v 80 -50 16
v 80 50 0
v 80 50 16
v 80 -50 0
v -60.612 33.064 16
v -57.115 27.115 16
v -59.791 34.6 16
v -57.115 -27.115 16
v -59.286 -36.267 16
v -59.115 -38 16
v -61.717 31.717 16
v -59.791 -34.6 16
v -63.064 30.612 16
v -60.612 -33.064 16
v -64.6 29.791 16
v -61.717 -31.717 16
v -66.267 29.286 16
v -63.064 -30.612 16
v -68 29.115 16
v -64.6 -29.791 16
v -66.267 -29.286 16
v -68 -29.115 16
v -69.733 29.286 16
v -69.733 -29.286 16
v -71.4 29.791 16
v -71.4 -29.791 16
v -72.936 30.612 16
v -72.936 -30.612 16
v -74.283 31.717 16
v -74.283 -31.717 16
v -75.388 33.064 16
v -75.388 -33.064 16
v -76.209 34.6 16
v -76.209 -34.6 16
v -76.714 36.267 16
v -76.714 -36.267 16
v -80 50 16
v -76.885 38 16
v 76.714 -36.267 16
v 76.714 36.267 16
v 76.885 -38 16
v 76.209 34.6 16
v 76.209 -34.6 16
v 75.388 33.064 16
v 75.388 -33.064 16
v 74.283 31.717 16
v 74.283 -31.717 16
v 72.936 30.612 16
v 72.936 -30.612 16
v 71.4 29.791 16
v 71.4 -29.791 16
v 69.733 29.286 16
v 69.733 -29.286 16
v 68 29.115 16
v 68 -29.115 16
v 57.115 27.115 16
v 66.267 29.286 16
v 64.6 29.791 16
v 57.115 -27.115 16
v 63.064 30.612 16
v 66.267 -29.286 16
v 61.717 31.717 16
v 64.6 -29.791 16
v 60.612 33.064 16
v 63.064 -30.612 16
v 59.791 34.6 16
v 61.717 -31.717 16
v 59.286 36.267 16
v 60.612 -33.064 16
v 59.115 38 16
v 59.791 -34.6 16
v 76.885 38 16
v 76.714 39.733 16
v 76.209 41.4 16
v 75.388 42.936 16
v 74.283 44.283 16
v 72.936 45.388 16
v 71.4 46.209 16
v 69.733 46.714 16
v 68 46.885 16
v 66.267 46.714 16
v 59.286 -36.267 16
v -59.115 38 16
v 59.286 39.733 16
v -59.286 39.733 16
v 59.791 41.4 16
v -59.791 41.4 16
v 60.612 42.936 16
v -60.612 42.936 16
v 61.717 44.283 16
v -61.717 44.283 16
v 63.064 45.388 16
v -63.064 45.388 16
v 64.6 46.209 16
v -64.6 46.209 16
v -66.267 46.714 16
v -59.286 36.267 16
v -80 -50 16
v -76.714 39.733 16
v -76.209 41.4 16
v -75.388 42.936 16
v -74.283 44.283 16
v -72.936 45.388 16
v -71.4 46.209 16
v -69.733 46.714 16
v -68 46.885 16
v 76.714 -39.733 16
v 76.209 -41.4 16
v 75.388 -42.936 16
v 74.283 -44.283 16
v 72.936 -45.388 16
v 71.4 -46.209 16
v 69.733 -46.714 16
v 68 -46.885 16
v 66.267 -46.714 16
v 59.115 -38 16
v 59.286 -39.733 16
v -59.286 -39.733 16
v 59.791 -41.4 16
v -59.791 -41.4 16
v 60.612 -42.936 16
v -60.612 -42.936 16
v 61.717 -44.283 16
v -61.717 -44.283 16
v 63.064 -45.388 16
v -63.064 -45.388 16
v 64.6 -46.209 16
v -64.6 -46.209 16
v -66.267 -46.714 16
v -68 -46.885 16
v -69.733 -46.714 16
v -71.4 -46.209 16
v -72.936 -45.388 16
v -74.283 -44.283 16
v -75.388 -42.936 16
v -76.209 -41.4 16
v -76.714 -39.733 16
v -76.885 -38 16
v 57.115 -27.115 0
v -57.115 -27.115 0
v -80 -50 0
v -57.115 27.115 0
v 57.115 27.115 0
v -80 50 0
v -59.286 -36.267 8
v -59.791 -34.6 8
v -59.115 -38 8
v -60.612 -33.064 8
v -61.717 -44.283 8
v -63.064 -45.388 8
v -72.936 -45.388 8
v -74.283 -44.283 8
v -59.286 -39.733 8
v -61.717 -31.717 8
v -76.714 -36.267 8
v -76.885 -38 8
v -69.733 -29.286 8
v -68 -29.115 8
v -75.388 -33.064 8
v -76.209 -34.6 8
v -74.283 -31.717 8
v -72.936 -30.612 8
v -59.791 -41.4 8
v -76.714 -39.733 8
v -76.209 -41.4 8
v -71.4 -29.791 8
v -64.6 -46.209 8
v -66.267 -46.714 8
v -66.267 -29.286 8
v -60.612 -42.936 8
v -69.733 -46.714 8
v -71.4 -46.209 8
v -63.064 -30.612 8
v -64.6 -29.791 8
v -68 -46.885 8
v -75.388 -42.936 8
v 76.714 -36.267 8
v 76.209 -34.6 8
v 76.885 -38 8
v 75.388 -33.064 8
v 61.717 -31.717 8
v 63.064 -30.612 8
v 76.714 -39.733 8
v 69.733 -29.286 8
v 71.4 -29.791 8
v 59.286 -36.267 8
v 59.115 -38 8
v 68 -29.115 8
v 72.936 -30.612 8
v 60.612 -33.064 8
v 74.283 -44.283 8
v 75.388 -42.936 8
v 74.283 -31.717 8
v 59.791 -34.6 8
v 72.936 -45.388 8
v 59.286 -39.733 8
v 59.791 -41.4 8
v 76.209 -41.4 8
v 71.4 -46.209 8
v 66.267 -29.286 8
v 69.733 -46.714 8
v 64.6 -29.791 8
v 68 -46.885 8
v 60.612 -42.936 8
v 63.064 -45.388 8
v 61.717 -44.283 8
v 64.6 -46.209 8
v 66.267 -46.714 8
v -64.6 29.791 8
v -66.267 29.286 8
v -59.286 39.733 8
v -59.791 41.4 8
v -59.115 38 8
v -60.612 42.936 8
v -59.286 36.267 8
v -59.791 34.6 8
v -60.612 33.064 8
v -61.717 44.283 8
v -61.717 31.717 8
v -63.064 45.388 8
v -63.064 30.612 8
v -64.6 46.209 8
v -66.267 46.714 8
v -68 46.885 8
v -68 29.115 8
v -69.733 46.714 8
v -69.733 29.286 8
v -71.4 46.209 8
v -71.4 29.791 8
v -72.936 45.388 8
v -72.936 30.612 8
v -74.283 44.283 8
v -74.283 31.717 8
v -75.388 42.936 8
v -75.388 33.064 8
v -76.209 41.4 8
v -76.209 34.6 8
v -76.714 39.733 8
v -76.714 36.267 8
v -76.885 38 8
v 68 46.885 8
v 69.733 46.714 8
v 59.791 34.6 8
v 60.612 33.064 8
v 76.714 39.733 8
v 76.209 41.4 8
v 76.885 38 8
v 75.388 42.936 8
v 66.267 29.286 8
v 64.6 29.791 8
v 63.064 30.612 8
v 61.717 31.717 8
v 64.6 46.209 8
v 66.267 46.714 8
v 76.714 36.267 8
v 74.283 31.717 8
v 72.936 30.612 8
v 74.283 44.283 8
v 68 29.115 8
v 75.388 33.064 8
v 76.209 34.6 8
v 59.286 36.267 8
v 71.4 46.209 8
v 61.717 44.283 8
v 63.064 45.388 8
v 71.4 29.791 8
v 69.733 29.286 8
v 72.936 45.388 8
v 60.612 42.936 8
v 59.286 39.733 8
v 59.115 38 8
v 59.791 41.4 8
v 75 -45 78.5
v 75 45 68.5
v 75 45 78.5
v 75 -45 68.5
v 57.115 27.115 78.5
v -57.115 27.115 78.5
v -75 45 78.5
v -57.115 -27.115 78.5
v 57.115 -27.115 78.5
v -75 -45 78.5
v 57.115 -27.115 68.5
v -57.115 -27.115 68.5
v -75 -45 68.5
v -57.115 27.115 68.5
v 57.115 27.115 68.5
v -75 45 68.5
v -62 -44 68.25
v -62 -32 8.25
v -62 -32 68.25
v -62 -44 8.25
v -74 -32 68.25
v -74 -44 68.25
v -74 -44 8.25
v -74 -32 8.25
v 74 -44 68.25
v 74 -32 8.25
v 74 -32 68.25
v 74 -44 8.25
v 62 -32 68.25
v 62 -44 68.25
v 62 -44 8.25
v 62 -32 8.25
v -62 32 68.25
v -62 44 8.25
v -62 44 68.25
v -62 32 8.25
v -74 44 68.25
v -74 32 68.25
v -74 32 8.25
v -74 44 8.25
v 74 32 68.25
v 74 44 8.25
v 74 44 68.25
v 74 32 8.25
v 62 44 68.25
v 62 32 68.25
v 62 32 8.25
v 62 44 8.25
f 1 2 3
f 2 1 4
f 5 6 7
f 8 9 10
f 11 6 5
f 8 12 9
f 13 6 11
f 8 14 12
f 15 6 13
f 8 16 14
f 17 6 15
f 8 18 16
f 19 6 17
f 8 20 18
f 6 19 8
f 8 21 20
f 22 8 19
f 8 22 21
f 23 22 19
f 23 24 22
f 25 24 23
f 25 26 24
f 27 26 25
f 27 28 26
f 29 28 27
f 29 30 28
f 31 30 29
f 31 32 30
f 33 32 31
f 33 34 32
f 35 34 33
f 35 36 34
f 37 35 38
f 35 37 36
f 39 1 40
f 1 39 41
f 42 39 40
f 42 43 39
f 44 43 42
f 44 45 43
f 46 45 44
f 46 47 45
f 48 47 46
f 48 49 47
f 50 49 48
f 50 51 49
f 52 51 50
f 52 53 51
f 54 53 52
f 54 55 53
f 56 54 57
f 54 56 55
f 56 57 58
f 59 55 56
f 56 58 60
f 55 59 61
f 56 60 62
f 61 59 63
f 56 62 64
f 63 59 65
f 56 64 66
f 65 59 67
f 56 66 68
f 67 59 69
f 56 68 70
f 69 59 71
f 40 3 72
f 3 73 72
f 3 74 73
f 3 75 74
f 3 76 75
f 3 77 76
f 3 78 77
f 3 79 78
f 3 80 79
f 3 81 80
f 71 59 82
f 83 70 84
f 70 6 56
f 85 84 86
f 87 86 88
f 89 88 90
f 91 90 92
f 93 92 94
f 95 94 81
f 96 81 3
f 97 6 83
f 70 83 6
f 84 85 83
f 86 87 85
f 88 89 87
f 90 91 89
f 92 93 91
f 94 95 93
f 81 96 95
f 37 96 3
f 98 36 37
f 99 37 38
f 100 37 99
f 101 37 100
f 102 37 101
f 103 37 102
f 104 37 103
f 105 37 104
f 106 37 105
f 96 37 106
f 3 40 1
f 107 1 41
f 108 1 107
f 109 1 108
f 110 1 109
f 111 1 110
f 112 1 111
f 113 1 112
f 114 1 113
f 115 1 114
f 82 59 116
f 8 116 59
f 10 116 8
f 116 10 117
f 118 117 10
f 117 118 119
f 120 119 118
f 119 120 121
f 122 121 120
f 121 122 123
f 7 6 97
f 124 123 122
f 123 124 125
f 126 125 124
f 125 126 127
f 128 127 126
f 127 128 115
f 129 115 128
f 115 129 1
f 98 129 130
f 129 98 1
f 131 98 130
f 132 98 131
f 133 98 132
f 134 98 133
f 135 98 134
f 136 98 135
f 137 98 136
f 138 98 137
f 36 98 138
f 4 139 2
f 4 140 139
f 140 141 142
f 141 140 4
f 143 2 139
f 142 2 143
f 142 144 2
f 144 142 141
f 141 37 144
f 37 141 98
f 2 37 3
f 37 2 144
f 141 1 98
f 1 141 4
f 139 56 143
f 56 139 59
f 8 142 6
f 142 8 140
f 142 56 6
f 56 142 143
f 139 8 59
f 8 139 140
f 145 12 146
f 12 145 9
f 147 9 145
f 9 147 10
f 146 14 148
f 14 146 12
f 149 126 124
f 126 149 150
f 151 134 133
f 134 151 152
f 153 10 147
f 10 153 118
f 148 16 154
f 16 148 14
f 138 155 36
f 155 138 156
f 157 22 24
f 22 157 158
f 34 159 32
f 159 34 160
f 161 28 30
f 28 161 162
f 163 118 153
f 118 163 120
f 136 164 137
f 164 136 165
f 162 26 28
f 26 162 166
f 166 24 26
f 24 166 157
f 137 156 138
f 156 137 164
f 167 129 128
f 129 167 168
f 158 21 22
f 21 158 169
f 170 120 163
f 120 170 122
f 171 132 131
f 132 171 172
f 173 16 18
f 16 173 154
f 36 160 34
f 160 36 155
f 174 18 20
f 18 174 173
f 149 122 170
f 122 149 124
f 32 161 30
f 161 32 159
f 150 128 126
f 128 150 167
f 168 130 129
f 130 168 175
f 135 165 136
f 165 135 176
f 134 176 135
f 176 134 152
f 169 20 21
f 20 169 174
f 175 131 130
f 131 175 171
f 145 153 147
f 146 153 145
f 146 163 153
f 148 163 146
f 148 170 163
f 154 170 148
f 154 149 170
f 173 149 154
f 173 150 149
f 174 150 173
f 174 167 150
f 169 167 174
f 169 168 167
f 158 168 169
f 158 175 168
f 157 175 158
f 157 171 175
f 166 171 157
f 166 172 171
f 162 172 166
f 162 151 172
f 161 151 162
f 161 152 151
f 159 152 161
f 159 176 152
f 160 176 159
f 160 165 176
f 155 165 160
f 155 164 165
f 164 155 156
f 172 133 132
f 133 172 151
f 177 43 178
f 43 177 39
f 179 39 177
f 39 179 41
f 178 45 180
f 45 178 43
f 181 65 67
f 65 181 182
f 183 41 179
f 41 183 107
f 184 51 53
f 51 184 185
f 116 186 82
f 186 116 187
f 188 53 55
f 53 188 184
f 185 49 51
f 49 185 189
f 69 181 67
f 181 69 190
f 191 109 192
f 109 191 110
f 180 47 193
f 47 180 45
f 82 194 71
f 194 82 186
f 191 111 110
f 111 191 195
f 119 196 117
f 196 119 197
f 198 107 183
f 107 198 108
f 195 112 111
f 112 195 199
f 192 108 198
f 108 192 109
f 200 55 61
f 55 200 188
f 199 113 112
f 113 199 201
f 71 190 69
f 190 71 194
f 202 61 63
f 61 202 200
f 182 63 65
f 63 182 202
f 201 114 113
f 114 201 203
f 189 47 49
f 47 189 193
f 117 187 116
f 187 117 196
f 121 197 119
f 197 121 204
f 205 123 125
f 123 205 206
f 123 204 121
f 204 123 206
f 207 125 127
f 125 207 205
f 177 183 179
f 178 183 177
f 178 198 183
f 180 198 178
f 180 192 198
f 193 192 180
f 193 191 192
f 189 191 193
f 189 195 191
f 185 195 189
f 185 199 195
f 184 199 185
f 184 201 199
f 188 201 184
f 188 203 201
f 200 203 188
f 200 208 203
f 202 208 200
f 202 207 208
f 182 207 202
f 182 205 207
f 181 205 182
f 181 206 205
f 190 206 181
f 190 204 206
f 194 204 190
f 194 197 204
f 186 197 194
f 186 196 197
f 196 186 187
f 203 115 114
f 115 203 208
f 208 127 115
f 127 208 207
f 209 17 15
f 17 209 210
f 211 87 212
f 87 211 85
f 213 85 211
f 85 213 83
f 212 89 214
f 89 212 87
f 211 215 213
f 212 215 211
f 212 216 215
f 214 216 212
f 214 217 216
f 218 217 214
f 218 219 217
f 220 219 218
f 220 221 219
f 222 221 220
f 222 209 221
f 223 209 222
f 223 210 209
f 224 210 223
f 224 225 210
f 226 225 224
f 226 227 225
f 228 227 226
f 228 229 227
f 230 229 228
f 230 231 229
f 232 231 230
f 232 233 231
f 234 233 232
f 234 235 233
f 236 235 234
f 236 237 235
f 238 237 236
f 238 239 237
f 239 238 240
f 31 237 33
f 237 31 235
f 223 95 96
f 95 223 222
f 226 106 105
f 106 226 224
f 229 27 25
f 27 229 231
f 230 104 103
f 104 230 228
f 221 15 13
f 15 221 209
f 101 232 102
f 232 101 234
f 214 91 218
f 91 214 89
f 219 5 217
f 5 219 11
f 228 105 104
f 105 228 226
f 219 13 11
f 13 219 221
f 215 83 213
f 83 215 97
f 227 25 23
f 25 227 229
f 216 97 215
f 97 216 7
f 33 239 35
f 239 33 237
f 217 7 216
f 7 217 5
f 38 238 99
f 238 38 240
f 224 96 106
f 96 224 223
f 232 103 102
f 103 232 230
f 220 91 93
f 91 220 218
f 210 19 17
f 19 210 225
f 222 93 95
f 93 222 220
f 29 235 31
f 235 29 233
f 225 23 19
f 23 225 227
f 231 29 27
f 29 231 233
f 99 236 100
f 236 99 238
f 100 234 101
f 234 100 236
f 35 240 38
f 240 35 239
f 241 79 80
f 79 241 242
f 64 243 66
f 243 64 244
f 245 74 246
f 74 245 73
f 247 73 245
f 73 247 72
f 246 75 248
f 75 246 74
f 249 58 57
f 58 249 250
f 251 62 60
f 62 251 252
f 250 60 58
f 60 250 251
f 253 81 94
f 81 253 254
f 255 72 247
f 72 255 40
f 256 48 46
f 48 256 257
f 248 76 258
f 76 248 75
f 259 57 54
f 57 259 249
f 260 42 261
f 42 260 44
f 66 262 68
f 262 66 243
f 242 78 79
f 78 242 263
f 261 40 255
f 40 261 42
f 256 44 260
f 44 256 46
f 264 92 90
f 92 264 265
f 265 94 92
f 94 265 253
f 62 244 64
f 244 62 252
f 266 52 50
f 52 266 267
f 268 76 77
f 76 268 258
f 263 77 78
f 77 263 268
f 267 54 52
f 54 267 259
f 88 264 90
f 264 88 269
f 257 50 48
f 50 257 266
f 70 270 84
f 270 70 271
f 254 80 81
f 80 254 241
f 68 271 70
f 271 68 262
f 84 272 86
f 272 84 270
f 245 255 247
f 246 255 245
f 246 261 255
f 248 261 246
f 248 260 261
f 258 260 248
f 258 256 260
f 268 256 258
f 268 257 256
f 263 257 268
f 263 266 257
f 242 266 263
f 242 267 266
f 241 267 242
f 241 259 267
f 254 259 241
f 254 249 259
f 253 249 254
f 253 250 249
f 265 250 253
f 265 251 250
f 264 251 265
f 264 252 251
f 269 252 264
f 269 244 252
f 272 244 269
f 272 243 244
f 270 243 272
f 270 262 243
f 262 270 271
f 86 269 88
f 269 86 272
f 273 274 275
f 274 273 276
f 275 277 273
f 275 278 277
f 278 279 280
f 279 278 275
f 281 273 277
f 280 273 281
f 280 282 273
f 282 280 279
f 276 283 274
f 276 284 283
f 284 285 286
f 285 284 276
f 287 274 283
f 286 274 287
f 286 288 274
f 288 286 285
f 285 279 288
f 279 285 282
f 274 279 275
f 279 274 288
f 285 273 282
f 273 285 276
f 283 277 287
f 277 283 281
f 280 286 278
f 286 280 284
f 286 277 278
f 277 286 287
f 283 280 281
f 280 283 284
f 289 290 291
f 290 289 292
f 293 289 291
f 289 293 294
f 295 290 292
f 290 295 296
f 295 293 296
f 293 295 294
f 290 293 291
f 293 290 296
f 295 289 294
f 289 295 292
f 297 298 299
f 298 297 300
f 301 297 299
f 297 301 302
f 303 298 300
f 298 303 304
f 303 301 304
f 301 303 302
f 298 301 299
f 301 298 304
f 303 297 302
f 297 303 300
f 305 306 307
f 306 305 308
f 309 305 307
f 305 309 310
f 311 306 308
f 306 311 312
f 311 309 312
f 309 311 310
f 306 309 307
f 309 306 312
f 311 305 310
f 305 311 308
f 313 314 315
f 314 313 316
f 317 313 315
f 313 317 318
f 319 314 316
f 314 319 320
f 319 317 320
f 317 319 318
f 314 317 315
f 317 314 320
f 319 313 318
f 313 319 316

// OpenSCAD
$fn = 32;

// ------------------------------------------------------------------------
// Frame cube: base 160 x 100 mm, posts 60 mm tall
// Every part is its own module, assembly() places every instance.
// ------------------------------------------------------------------------

// --- part 1 ---
module base_frame() {
  difference() {
    translate([-80, -50, 0]) cube([160, 100, 16]);
    translate([-57.115, -27.115, -1]) cube([114.23, 54.23, 18]);
    translate([-68, -38, 8]) cylinder(h = 9, d = 17.77);
    translate([68, -38, 8]) cylinder(h = 9, d = 17.77);
    translate([-68, 38, 8]) cylinder(h = 9, d = 17.77);
    translate([68, 38, 8]) cylinder(h = 9, d = 17.77);
  }
}

// --- part 2 ---
module corner_post() {
  translate([-6, -6, 0]) cube([12, 12, 60]);
}

// --- part 3 ---
module top_frame() {
  difference() {
    translate([-75, -45, 0]) cube([150, 90, 10]);
    translate([-57.115, -27.115, -1]) cube([114.23, 54.23, 12]);
  }
}

// --- assembly ---
module assembly() {
  color([0.80, 0.24, 0.20]) translate([0, 0, 0]) rotate([0, 0, 0]) base_frame();
  color([0.20, 0.45, 0.75]) translate([-68, -38, 8.25]) rotate([0, 0, 0]) corner_post();
  color([0.25, 0.62, 0.32]) translate([68, -38, 8.25]) rotate([0, 0, 0]) corner_post();
  color([0.92, 0.70, 0.18]) translate([-68, 38, 8.25]) rotate([0, 0, 0]) corner_post();
  color([0.58, 0.35, 0.70]) translate([68, 38, 8.25]) rotate([0, 0, 0]) corner_post();
  color([0.16, 0.66, 0.66]) translate([0, 0, 68.5]) rotate([0, 0, 0]) top_frame();
}

assembly();
